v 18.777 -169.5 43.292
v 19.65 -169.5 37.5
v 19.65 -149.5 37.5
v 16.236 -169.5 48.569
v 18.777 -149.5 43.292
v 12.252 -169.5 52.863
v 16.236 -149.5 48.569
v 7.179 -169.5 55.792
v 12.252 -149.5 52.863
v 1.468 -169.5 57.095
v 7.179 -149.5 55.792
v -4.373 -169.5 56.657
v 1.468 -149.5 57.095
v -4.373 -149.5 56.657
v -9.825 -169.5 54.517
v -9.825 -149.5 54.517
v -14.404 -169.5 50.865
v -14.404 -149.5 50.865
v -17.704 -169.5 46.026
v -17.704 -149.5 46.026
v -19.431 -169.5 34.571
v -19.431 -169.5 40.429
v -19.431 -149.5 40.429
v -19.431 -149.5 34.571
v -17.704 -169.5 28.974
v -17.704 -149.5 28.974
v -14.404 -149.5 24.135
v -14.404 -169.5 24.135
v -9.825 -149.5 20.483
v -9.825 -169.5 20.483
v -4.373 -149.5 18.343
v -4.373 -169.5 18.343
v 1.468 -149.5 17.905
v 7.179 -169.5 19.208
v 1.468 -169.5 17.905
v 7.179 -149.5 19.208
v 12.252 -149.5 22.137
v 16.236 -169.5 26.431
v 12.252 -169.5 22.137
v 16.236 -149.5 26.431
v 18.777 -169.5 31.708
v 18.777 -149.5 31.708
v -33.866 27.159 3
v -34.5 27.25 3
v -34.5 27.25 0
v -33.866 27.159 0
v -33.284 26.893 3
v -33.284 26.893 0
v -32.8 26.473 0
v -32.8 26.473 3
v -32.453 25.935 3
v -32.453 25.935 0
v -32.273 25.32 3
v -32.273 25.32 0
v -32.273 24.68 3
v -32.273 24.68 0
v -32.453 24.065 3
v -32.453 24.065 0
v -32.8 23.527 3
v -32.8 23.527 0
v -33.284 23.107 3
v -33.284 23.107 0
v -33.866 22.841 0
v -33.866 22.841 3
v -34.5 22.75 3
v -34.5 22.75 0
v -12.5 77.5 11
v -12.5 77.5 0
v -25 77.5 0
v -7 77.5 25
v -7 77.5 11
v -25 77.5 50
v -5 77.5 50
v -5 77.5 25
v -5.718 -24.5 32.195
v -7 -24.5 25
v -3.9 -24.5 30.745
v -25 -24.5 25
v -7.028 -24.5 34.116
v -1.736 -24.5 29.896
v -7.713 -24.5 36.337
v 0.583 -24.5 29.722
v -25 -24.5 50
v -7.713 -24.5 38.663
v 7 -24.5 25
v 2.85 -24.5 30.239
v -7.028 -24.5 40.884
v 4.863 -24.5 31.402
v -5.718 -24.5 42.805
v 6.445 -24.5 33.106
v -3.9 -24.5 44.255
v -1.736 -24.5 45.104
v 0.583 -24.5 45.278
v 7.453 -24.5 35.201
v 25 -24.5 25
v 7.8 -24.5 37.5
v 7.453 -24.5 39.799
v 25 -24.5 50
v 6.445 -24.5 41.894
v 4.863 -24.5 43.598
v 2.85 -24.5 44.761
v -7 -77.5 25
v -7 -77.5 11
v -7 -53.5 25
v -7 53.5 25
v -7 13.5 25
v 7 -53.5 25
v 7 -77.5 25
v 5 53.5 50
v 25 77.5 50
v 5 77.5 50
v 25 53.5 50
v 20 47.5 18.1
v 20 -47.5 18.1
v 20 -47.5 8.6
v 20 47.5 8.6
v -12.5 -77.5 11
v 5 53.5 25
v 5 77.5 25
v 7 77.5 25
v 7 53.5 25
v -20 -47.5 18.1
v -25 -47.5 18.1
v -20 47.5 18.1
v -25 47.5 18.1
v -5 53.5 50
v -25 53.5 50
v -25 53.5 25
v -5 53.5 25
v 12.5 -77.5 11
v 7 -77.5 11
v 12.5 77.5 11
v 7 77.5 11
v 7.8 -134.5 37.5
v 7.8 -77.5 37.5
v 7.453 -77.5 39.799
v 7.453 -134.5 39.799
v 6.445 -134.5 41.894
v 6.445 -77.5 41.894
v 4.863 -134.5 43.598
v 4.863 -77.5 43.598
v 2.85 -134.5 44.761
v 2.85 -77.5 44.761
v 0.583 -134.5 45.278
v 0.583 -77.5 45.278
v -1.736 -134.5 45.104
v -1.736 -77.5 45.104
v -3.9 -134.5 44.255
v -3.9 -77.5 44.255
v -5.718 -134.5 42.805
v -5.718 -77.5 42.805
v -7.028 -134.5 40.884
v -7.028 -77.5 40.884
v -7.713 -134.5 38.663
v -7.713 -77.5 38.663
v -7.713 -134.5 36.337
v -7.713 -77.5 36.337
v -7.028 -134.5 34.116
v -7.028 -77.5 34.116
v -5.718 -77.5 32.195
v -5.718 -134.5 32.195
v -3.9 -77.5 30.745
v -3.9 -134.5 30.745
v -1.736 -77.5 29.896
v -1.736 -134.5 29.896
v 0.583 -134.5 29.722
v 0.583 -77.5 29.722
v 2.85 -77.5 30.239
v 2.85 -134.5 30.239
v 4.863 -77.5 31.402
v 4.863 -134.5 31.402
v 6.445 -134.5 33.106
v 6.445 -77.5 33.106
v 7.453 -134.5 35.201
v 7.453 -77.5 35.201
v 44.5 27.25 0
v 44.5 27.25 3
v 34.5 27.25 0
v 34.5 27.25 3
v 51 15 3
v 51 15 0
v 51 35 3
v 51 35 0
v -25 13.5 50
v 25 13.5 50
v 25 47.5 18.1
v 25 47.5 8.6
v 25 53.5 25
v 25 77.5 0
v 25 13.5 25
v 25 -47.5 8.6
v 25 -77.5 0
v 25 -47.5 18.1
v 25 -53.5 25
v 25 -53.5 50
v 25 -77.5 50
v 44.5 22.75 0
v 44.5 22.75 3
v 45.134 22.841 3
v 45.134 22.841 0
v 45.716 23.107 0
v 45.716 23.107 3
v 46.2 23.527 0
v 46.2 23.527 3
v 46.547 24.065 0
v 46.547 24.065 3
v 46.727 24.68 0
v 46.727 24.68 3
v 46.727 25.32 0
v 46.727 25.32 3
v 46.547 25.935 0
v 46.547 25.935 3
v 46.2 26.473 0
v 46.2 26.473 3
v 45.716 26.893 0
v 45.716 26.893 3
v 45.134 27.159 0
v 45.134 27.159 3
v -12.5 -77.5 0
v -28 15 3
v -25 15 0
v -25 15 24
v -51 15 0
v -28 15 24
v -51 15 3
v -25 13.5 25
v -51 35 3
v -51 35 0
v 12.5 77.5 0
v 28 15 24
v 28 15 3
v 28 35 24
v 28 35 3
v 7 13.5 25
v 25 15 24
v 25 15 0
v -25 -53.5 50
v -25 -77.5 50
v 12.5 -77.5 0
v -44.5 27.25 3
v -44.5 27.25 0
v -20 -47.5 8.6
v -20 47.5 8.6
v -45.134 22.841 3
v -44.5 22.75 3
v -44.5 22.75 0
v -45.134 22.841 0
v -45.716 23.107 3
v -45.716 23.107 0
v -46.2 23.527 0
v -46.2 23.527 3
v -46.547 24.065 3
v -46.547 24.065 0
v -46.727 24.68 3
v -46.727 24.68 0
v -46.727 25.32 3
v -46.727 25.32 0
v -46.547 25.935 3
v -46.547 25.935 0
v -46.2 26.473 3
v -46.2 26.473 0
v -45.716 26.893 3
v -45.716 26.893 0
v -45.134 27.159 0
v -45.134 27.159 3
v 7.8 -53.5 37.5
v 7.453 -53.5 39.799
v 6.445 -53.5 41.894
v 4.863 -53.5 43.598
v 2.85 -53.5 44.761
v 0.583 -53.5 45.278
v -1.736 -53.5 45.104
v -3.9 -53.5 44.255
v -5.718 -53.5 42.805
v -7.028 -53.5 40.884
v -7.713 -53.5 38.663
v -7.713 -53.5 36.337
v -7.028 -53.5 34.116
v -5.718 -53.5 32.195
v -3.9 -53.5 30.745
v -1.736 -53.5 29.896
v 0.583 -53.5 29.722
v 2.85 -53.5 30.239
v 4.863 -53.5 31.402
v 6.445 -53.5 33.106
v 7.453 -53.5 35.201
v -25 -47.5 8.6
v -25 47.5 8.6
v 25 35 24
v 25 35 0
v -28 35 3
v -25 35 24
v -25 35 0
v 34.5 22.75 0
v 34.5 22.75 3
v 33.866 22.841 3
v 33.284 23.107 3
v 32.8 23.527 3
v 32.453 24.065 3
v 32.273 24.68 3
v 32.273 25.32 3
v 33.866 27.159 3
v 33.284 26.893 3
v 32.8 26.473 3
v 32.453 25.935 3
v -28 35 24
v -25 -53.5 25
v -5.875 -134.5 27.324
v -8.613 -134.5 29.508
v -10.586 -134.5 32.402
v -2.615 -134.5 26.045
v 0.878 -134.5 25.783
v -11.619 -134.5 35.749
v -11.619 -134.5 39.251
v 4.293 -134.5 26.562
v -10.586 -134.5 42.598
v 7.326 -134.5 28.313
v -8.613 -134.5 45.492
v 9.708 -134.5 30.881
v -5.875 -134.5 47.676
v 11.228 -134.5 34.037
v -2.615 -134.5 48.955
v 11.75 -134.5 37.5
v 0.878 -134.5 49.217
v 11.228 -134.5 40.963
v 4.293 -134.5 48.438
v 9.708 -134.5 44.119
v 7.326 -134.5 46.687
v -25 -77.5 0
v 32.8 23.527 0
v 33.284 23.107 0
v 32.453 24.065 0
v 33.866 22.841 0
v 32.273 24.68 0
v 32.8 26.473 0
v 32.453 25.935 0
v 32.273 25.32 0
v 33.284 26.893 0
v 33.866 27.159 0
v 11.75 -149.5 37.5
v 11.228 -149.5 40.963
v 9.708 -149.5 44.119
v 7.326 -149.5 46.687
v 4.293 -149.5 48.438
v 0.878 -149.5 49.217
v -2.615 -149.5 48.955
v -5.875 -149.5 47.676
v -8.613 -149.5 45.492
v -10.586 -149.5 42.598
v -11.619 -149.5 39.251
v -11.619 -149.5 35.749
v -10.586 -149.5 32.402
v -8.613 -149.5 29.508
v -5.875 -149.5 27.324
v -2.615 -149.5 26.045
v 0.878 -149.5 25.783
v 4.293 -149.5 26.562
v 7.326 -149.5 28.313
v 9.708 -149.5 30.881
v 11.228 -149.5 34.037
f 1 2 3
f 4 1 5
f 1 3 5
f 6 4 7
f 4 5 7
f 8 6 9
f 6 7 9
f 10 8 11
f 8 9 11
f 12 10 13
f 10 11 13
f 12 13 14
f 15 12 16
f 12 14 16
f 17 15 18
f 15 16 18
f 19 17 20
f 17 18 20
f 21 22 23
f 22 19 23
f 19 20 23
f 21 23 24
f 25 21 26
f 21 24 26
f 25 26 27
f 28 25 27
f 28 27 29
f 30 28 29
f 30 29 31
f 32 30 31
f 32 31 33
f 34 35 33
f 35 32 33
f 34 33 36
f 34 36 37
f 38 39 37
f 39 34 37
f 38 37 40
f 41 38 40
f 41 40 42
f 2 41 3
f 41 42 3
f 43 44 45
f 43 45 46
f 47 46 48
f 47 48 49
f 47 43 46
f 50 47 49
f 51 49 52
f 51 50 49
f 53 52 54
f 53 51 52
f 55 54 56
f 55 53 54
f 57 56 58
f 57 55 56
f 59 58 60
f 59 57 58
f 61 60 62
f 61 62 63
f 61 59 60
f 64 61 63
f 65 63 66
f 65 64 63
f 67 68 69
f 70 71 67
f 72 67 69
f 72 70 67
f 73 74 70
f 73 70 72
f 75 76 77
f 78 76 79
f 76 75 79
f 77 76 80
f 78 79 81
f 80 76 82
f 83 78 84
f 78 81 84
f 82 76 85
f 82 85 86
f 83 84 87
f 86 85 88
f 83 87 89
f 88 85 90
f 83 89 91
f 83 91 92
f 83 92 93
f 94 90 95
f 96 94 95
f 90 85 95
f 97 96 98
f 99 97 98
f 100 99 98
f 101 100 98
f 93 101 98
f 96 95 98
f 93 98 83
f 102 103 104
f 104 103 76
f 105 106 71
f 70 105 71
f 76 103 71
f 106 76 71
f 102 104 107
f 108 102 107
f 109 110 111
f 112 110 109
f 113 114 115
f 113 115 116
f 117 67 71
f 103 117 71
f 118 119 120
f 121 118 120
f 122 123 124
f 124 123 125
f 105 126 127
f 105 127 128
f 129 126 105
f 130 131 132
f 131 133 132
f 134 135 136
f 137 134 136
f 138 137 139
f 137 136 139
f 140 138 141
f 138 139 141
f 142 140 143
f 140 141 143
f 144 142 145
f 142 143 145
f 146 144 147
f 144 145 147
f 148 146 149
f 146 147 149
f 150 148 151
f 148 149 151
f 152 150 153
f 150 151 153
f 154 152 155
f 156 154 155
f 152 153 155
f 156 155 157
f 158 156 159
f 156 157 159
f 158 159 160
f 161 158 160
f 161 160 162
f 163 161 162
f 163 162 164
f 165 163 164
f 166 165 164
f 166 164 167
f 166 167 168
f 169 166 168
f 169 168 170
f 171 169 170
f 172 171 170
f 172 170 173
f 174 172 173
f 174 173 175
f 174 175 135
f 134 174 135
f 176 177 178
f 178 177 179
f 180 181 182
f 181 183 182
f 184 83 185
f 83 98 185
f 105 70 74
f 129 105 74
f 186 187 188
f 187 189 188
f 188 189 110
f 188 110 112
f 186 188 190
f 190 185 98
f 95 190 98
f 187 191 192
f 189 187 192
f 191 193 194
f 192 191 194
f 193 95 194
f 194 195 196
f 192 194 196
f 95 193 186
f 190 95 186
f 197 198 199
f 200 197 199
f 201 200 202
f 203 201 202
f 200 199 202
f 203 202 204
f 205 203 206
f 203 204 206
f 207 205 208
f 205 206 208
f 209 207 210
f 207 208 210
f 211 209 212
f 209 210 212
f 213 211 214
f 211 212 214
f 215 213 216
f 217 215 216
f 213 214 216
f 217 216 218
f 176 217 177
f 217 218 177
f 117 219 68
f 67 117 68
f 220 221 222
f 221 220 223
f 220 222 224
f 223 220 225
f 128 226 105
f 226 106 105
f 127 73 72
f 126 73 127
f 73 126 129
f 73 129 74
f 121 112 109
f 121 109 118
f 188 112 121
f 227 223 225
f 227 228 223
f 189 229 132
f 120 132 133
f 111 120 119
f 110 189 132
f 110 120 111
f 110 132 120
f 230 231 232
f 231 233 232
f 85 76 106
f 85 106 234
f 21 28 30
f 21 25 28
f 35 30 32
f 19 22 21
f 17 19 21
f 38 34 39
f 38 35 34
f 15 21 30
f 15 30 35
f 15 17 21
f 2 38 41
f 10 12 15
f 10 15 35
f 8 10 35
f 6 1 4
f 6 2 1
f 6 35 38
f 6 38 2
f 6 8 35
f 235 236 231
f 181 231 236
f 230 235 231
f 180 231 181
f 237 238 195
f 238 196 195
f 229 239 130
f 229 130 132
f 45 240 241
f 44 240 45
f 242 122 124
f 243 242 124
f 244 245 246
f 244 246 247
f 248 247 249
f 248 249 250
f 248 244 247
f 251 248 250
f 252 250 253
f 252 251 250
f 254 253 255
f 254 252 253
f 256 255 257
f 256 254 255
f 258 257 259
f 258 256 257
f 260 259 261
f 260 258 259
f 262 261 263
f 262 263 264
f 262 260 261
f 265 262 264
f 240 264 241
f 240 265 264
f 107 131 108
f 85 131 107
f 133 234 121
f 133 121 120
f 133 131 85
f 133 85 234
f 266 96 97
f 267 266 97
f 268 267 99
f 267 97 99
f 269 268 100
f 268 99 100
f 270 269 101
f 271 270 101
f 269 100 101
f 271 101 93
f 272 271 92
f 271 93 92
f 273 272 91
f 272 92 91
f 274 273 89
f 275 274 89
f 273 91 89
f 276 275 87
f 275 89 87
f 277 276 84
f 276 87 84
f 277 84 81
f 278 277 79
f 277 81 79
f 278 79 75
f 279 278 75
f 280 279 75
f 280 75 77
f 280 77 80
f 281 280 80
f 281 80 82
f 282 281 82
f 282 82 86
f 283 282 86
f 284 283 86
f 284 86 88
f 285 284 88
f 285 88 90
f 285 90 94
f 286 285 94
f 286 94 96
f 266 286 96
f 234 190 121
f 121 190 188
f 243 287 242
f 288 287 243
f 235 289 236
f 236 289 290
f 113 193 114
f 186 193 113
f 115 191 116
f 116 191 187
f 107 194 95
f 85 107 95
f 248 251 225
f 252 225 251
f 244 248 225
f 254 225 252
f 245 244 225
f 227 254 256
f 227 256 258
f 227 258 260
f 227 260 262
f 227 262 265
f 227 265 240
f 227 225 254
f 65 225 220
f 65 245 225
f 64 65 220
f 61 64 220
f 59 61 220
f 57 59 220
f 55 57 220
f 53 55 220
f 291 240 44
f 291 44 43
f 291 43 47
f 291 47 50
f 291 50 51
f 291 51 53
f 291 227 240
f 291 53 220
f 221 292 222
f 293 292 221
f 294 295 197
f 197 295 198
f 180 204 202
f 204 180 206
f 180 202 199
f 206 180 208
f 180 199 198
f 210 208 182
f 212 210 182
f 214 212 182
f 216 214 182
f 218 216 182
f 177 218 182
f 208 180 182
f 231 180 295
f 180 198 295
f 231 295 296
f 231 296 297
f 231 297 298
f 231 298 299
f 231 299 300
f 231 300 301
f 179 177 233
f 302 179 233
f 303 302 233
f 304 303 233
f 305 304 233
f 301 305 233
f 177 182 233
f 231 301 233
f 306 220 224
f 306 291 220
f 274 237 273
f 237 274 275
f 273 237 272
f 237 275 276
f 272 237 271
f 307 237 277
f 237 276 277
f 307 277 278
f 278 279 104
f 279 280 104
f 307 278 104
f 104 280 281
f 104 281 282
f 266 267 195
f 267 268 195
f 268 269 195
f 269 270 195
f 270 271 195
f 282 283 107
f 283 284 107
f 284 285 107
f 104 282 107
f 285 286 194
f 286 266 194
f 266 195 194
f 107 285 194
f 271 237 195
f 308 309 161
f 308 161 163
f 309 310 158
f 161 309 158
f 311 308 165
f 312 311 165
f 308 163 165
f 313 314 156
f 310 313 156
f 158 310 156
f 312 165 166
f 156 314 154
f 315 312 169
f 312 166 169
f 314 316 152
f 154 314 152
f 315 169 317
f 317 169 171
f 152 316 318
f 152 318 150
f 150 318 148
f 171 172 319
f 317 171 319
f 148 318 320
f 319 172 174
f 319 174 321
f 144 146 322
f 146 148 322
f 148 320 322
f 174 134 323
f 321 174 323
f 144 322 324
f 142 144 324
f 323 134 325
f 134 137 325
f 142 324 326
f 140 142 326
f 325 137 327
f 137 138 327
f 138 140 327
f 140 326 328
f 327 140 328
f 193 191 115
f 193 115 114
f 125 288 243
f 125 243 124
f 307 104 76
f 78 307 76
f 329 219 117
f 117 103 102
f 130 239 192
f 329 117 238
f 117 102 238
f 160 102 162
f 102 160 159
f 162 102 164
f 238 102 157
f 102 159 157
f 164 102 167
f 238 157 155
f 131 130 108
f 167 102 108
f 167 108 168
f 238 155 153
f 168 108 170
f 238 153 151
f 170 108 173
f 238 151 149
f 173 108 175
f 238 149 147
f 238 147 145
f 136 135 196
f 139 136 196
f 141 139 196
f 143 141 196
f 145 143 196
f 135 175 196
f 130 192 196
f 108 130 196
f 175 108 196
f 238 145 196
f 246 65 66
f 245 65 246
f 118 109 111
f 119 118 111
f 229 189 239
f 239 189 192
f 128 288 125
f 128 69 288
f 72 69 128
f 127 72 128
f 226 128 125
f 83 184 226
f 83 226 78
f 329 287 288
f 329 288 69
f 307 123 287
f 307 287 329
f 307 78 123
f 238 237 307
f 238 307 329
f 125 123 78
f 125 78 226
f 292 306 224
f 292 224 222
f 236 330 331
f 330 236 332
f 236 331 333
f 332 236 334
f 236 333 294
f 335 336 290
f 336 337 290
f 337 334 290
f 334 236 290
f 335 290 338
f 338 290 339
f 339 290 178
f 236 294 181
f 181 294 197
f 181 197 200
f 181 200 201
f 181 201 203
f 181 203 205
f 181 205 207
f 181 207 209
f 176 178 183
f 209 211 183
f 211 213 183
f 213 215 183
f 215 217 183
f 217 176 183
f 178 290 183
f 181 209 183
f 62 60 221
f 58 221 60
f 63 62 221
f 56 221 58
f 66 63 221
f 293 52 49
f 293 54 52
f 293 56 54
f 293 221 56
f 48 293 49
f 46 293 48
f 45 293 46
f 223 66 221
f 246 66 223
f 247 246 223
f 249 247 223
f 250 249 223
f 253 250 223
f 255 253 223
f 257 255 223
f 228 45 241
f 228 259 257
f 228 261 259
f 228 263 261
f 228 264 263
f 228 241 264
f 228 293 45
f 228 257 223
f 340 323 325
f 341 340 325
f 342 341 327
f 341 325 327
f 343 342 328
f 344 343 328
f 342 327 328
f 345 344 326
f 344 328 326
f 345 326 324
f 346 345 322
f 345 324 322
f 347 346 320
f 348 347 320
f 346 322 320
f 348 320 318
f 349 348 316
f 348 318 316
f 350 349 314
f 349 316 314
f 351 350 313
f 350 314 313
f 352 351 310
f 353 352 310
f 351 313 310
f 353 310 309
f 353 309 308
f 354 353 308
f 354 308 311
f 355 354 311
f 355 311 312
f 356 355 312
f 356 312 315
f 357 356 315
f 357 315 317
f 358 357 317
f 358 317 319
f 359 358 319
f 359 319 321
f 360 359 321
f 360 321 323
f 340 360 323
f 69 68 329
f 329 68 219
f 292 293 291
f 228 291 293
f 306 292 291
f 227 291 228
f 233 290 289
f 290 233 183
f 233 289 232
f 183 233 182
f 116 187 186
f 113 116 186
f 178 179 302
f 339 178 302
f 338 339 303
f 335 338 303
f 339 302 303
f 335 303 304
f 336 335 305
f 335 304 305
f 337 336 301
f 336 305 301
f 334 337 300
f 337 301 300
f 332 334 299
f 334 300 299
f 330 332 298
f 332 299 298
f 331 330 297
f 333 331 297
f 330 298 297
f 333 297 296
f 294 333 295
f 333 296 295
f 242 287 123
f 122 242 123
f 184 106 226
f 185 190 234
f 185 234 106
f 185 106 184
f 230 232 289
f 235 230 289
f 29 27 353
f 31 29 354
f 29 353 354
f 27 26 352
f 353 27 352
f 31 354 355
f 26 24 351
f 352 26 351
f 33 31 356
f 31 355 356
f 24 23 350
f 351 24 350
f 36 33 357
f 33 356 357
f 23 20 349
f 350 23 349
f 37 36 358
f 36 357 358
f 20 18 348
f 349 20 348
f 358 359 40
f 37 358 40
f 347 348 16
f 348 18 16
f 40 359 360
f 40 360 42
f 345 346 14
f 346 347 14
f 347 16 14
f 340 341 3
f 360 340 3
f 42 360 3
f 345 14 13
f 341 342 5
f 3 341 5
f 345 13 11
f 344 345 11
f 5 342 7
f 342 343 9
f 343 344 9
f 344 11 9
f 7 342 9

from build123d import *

# Parameters (mm, degrees)
F1_DEPTH       = 25
F3_W           = 38
F3_H           = 25
F4_DEPTH       = 25
F4_DEPTH_BACK  = 25
F5_R           = 7.8
F6_DEPTH       = 110
F7_R           = 11.75
F8_DEPTH       = 15
F9_R           = 19.65
F10_DEPTH      = 20
F11_W          = 95
F11_H          = 9.5
F12_DEPTH      = 5
F14_W          = 14
F14_H          = 170
F15_DEPTH      = 25
F16_W          = 25
F16_H          = 170
F17_DEPTH      = 11
F18_W          = 10
F18_H          = 24
F19_DEPTH      = 26
F23_DEPTH      = 10
F23_DEPTH_BACK = 10
F25_DEPTH      = 3


with BuildPart() as f1:
    # F0 (on Right) → F1 (new body)
    with BuildSketch(Plane.YZ):
        Polygon((0, 25), (0, 0), (77.5, 0), (77.5, 50), (53.5, 50), (53.5, 25), align=None)
    extrude(amount=F1_DEPTH)

    # F2: F1 across plane


with BuildPart() as f1_1:
    add(f1.part)
    add(f1.part.mirror(Plane.XZ))

    # F3 (on Right) → F4 (join, two sides)
    with BuildSketch(Plane.YZ) as f4_sk:
        with Locations((-5.5, 37.5)):
            Rectangle(F3_W, F3_H)
    extrude(amount=F4_DEPTH)
    extrude(f4_sk.sketch, amount=-F4_DEPTH_BACK)

    # F5 (on face) → F6 (join)
    with BuildSketch(Plane.XZ.offset(24.5)):
        with Locations((0, 37.5)):
            Circle(F5_R)
    extrude(amount=F6_DEPTH)

    # F7 (on face) → F8 (join)
    with BuildSketch(Plane.XZ.offset(134.5)):
        with Locations((0, 37.5)):
            Circle(F7_R)
    extrude(amount=F8_DEPTH)

    # F9 (on face) → F10 (join)
    with BuildSketch(Plane.XZ.offset(149.5)):
        with Locations((0, 37.5)):
            Circle(F9_R)
    extrude(amount=F10_DEPTH)

    # F11 (on face) → F12 (cut)
    with BuildSketch(Plane.YZ.offset(25)):
        with Locations((0, 13.35)):
            Rectangle(F11_W, F11_H)
    extrude(amount=-F12_DEPTH, mode=Mode.SUBTRACT)

    # F13: F1 across plane


with BuildPart() as f1_2:
    add(f1_1.part)
    add(f1_1.part.mirror(Plane.YZ))

    # F14 (on Top) → F15 (cut, through all)
    with BuildSketch(Plane.XY):
        Rectangle(F14_W, F14_H)
    extrude(amount=F15_DEPTH, mode=Mode.SUBTRACT)

    # F16 (on Top) → F17 (cut)
    with BuildSketch(Plane.XY):
        Rectangle(F16_W, F16_H)
    extrude(amount=F17_DEPTH, mode=Mode.SUBTRACT)

    # F18 (on face) → F19 (cut)
    with BuildSketch(Plane.XY.offset(50)):
        with Locations((0, 65.5)):
            Rectangle(F18_W, F18_H)
    extrude(amount=-F19_DEPTH, mode=Mode.SUBTRACT)


with BuildPart() as f23:
    # F22 (on offset) → F23 (new body, two sides)
    with BuildSketch(Plane.XZ.offset(-25)) as f23_sk:
        Polygon((25, 0), (51, 0), (51, 3), (28, 3), (28, 24), (25, 24), align=None)
    extrude(amount=-F23_DEPTH)
    extrude(f23_sk.sketch, amount=F23_DEPTH_BACK)

    # F24 (on face) → F25 (cut, through all)
    with BuildSketch(Plane.XY.offset(3)):
        with BuildLine():
            ThreePointArc((34.5, 27.25), (32.25, 25), (34.5, 22.75))
            Line((34.5, 22.75), (44.5, 22.75))
            ThreePointArc((44.5, 22.75), (46.75, 25), (44.5, 27.25))
            Line((44.5, 27.25), (34.5, 27.25))
        make_face()
    extrude(amount=-F25_DEPTH, mode=Mode.SUBTRACT)


with BuildPart() as f26_1:
    # F26: instance of F23
    add(f23.part.mirror(Plane.YZ))


solid = Compound([f1_2.part, f23.part, f26_1.part])
